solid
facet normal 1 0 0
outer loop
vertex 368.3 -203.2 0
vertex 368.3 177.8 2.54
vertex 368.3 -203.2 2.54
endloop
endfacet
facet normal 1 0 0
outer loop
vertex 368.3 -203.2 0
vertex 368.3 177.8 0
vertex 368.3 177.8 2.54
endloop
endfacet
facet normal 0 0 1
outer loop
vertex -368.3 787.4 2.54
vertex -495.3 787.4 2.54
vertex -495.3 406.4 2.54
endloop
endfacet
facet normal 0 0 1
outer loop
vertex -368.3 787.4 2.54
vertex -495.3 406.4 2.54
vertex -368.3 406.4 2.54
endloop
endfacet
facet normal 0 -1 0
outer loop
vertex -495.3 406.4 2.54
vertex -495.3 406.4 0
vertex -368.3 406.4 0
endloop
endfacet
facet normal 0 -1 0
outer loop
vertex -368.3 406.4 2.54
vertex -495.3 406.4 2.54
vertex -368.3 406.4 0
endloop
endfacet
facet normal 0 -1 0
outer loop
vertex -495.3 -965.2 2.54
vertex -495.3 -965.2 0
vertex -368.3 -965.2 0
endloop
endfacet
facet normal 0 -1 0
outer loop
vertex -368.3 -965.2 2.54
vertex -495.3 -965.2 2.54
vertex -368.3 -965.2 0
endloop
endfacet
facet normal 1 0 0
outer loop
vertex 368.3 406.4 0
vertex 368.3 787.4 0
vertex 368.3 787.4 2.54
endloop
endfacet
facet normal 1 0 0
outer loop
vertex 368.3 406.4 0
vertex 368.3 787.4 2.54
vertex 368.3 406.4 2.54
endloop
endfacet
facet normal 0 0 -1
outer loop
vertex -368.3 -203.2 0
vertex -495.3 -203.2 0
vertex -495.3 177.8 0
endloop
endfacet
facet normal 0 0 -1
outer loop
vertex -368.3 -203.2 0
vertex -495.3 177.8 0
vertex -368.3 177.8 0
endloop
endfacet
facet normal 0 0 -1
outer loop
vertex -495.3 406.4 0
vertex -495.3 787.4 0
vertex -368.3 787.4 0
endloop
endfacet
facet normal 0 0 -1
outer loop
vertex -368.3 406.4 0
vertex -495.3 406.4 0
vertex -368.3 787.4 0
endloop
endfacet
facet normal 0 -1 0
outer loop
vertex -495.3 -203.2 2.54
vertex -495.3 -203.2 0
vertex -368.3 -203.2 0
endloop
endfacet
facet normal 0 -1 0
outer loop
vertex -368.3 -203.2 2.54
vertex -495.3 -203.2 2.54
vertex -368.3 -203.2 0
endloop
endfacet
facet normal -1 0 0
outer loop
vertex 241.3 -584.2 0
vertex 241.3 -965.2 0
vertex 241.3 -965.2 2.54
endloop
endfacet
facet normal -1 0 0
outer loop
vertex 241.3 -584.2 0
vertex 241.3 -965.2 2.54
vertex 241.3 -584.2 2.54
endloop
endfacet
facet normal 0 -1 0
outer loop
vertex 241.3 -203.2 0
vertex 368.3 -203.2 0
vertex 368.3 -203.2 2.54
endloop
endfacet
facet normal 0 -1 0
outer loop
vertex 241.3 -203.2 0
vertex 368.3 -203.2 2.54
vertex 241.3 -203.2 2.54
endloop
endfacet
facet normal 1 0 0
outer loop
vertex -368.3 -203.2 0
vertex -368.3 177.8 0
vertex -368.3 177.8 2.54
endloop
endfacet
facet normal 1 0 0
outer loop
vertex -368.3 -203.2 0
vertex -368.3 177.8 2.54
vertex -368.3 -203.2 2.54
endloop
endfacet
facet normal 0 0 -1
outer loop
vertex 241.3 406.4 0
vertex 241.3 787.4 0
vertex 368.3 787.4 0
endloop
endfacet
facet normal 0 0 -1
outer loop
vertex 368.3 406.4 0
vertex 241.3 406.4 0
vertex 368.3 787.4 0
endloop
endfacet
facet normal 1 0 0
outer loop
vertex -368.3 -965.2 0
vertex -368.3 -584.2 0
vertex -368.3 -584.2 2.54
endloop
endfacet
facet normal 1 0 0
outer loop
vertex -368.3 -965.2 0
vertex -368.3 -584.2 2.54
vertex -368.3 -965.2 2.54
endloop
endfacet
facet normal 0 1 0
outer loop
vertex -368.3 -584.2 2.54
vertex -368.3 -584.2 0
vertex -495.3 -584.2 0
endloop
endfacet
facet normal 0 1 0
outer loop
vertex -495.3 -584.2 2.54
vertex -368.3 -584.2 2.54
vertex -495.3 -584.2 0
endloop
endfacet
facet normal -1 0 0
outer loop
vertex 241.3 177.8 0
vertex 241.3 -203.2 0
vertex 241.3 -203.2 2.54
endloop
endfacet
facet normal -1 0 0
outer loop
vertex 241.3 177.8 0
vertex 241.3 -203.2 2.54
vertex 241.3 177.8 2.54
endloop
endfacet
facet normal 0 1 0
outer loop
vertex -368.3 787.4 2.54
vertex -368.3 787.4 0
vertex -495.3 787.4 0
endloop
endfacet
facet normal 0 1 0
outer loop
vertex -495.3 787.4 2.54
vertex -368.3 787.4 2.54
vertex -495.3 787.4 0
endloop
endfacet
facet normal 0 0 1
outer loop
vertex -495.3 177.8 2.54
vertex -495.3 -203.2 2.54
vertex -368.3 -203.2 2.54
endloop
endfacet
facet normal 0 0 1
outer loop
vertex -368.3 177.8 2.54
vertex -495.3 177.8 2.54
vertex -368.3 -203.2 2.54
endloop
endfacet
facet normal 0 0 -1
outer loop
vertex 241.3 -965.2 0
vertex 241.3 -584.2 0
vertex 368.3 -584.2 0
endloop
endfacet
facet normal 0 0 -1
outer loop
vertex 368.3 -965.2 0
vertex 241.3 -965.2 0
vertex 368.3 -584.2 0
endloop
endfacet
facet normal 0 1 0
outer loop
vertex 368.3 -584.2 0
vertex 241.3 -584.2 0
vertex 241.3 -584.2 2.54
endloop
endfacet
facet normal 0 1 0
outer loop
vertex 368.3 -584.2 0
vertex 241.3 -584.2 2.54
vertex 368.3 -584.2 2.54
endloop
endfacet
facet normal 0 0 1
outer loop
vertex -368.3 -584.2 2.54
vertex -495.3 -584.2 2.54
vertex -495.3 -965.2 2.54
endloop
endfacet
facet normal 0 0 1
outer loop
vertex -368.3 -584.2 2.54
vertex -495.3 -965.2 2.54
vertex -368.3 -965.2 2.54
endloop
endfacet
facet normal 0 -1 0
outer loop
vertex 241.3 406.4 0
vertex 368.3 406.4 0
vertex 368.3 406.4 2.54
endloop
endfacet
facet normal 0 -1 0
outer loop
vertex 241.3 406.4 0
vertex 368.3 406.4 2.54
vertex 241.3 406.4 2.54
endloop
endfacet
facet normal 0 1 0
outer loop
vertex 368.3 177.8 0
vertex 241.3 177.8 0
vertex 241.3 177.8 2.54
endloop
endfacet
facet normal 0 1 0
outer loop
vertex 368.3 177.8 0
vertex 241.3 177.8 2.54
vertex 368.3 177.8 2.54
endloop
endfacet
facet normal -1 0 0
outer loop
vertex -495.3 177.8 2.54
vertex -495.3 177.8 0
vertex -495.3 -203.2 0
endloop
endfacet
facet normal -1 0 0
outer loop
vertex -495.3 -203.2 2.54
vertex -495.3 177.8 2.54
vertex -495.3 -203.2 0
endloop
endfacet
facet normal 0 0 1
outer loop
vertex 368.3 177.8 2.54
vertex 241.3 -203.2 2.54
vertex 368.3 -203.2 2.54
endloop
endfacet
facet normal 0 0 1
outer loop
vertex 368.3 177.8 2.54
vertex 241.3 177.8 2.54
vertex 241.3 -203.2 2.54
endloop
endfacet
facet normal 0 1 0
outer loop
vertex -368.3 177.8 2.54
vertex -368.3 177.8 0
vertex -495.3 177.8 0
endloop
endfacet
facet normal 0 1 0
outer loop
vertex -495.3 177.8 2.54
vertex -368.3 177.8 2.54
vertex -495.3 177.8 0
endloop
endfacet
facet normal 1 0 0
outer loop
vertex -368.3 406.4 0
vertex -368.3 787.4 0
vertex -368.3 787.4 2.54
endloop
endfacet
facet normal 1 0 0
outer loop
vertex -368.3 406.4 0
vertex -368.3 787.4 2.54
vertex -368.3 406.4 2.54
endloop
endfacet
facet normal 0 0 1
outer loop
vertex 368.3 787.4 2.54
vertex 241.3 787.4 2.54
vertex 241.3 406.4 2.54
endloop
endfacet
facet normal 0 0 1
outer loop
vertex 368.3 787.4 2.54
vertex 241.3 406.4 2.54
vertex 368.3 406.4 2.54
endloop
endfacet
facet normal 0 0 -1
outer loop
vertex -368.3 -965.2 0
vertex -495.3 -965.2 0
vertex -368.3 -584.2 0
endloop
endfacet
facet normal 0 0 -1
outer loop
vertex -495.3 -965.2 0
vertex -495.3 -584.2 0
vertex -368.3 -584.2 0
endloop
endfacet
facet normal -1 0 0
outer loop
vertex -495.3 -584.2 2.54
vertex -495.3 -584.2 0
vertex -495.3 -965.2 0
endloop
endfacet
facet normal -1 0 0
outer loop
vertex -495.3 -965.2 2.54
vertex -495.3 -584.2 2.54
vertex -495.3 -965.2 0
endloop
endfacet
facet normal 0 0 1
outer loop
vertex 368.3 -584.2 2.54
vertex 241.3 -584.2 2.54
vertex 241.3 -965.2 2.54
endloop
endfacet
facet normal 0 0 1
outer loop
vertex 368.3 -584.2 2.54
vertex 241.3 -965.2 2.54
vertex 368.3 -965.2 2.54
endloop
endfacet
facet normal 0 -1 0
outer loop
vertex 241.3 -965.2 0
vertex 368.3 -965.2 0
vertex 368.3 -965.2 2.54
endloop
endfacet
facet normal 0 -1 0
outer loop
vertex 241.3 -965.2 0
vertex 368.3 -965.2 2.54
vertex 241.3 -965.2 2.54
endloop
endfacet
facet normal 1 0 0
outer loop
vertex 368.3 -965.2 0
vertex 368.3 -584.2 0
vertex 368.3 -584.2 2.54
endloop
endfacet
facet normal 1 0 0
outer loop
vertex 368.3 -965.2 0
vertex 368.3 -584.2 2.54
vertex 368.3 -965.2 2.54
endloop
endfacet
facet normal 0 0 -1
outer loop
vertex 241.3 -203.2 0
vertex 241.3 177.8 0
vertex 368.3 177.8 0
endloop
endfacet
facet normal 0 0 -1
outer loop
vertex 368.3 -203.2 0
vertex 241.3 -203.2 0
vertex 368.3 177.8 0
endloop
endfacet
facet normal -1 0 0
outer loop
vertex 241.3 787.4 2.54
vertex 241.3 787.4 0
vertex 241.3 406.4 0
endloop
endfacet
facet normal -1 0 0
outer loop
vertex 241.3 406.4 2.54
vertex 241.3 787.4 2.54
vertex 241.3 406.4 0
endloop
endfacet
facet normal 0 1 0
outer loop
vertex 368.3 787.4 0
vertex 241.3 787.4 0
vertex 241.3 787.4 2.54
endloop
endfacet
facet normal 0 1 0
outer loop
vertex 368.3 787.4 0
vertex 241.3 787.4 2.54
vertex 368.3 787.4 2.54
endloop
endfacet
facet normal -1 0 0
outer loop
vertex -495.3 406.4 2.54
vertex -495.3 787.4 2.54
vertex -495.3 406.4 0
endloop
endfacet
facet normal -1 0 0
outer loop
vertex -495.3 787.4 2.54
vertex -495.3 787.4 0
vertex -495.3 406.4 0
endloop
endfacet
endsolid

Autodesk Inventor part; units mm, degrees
ref_plane "YZ Plane" through (0, 0, 0) normal (1, 0, 0) x (0, 1, 0)
ref_plane "XZ Plane" through (0, 0, 0) normal (0, 1, 0) x (-1, 0, 0)
ref_plane "XY Plane" through (0, 0, 0) normal (0, 0, 1) x (1, 0, 0)
ref_plane "Work Plane1" through (0, 0, 0) normal (0, 0, 1) x (1, 0, 0)
sketch "Sketch1" plane through (0, 0, 0) normal (0, 0, 1) x (1, 0, 0)
  line L0 (-368.3, 406.4) -> (-368.3, -406.4) projected
  line L1 (-368.3, 1092.2) -> (-368.3, 406.4) projected
  line L2 (241.3, 1092.2) -> (241.3, 406.4) projected
  line L3 (241.3, -406.4) -> (241.3, 406.4) projected
  line L4 (-368.3, -406.4) -> (-368.3, -1092.2) projected
  line L5 (241.3, -1092.2) -> (241.3, -406.4) projected
  line L6 (-368.3, 787.4) -> (-495.3, 787.4)
  line L7 (-495.3, 787.4) -> (-495.3, 406.4)
  line L8 (-495.3, 406.4) -> (-368.3, 406.4)
  line L9 (-368.3, 406.4) -> (-368.3, 787.4)
  line L10 (-368.3, 177.8) -> (-495.3, 177.8)
  line L11 (-495.3, 177.8) -> (-495.3, -203.2)
  line L12 (-495.3, -203.2) -> (-368.3, -203.2)
  line L13 (-368.3, -203.2) -> (-368.3, 177.8)
  line L14 (-368.3, -584.2) -> (-495.3, -584.2)
  line L15 (-495.3, -584.2) -> (-495.3, -965.2)
  line L16 (-495.3, -965.2) -> (-368.3, -965.2)
  line L17 (-368.3, -965.2) -> (-368.3, -584.2)
  line L18 (241.3, 787.4) -> (368.3, 787.4)
  line L19 (368.3, 787.4) -> (368.3, 406.4)
  line L20 (368.3, 406.4) -> (241.3, 406.4)
  line L21 (241.3, 406.4) -> (241.3, 787.4)
  line L22 (241.3, 177.8) -> (368.3, 177.8)
  line L23 (368.3, 177.8) -> (368.3, -203.2)
  line L24 (368.3, -203.2) -> (241.3, -203.2)
  line L25 (241.3, -203.2) -> (241.3, 177.8)
  line L26 (241.3, -584.2) -> (368.3, -584.2)
  line L27 (368.3, -584.2) -> (368.3, -965.2)
  line L28 (368.3, -965.2) -> (241.3, -965.2)
  line L29 (241.3, -965.2) -> (241.3, -584.2)
  line L30 (2438.4, 1219.2) -> (-2451.1, 1219.2) projected
  line L31 (-2451.1, -1219.2) -> (2438.4, -1219.2) projected
  point P0 (0, 0)
  dimension "d0" = 127
  dimension "d1" = 127
  dimension "d2" = 381
  dimension "d3" = 381
  dimension "d4" = 381
  dimension "d5" = 254
  dimension "d6" = 381
  dimension "d7" = 228.6
extrude "Extrusion1" add sketch "Sketch1" along normal blind 2.54
equation "\"d1\" = d0"
properties part number "Stripes on the floor"
